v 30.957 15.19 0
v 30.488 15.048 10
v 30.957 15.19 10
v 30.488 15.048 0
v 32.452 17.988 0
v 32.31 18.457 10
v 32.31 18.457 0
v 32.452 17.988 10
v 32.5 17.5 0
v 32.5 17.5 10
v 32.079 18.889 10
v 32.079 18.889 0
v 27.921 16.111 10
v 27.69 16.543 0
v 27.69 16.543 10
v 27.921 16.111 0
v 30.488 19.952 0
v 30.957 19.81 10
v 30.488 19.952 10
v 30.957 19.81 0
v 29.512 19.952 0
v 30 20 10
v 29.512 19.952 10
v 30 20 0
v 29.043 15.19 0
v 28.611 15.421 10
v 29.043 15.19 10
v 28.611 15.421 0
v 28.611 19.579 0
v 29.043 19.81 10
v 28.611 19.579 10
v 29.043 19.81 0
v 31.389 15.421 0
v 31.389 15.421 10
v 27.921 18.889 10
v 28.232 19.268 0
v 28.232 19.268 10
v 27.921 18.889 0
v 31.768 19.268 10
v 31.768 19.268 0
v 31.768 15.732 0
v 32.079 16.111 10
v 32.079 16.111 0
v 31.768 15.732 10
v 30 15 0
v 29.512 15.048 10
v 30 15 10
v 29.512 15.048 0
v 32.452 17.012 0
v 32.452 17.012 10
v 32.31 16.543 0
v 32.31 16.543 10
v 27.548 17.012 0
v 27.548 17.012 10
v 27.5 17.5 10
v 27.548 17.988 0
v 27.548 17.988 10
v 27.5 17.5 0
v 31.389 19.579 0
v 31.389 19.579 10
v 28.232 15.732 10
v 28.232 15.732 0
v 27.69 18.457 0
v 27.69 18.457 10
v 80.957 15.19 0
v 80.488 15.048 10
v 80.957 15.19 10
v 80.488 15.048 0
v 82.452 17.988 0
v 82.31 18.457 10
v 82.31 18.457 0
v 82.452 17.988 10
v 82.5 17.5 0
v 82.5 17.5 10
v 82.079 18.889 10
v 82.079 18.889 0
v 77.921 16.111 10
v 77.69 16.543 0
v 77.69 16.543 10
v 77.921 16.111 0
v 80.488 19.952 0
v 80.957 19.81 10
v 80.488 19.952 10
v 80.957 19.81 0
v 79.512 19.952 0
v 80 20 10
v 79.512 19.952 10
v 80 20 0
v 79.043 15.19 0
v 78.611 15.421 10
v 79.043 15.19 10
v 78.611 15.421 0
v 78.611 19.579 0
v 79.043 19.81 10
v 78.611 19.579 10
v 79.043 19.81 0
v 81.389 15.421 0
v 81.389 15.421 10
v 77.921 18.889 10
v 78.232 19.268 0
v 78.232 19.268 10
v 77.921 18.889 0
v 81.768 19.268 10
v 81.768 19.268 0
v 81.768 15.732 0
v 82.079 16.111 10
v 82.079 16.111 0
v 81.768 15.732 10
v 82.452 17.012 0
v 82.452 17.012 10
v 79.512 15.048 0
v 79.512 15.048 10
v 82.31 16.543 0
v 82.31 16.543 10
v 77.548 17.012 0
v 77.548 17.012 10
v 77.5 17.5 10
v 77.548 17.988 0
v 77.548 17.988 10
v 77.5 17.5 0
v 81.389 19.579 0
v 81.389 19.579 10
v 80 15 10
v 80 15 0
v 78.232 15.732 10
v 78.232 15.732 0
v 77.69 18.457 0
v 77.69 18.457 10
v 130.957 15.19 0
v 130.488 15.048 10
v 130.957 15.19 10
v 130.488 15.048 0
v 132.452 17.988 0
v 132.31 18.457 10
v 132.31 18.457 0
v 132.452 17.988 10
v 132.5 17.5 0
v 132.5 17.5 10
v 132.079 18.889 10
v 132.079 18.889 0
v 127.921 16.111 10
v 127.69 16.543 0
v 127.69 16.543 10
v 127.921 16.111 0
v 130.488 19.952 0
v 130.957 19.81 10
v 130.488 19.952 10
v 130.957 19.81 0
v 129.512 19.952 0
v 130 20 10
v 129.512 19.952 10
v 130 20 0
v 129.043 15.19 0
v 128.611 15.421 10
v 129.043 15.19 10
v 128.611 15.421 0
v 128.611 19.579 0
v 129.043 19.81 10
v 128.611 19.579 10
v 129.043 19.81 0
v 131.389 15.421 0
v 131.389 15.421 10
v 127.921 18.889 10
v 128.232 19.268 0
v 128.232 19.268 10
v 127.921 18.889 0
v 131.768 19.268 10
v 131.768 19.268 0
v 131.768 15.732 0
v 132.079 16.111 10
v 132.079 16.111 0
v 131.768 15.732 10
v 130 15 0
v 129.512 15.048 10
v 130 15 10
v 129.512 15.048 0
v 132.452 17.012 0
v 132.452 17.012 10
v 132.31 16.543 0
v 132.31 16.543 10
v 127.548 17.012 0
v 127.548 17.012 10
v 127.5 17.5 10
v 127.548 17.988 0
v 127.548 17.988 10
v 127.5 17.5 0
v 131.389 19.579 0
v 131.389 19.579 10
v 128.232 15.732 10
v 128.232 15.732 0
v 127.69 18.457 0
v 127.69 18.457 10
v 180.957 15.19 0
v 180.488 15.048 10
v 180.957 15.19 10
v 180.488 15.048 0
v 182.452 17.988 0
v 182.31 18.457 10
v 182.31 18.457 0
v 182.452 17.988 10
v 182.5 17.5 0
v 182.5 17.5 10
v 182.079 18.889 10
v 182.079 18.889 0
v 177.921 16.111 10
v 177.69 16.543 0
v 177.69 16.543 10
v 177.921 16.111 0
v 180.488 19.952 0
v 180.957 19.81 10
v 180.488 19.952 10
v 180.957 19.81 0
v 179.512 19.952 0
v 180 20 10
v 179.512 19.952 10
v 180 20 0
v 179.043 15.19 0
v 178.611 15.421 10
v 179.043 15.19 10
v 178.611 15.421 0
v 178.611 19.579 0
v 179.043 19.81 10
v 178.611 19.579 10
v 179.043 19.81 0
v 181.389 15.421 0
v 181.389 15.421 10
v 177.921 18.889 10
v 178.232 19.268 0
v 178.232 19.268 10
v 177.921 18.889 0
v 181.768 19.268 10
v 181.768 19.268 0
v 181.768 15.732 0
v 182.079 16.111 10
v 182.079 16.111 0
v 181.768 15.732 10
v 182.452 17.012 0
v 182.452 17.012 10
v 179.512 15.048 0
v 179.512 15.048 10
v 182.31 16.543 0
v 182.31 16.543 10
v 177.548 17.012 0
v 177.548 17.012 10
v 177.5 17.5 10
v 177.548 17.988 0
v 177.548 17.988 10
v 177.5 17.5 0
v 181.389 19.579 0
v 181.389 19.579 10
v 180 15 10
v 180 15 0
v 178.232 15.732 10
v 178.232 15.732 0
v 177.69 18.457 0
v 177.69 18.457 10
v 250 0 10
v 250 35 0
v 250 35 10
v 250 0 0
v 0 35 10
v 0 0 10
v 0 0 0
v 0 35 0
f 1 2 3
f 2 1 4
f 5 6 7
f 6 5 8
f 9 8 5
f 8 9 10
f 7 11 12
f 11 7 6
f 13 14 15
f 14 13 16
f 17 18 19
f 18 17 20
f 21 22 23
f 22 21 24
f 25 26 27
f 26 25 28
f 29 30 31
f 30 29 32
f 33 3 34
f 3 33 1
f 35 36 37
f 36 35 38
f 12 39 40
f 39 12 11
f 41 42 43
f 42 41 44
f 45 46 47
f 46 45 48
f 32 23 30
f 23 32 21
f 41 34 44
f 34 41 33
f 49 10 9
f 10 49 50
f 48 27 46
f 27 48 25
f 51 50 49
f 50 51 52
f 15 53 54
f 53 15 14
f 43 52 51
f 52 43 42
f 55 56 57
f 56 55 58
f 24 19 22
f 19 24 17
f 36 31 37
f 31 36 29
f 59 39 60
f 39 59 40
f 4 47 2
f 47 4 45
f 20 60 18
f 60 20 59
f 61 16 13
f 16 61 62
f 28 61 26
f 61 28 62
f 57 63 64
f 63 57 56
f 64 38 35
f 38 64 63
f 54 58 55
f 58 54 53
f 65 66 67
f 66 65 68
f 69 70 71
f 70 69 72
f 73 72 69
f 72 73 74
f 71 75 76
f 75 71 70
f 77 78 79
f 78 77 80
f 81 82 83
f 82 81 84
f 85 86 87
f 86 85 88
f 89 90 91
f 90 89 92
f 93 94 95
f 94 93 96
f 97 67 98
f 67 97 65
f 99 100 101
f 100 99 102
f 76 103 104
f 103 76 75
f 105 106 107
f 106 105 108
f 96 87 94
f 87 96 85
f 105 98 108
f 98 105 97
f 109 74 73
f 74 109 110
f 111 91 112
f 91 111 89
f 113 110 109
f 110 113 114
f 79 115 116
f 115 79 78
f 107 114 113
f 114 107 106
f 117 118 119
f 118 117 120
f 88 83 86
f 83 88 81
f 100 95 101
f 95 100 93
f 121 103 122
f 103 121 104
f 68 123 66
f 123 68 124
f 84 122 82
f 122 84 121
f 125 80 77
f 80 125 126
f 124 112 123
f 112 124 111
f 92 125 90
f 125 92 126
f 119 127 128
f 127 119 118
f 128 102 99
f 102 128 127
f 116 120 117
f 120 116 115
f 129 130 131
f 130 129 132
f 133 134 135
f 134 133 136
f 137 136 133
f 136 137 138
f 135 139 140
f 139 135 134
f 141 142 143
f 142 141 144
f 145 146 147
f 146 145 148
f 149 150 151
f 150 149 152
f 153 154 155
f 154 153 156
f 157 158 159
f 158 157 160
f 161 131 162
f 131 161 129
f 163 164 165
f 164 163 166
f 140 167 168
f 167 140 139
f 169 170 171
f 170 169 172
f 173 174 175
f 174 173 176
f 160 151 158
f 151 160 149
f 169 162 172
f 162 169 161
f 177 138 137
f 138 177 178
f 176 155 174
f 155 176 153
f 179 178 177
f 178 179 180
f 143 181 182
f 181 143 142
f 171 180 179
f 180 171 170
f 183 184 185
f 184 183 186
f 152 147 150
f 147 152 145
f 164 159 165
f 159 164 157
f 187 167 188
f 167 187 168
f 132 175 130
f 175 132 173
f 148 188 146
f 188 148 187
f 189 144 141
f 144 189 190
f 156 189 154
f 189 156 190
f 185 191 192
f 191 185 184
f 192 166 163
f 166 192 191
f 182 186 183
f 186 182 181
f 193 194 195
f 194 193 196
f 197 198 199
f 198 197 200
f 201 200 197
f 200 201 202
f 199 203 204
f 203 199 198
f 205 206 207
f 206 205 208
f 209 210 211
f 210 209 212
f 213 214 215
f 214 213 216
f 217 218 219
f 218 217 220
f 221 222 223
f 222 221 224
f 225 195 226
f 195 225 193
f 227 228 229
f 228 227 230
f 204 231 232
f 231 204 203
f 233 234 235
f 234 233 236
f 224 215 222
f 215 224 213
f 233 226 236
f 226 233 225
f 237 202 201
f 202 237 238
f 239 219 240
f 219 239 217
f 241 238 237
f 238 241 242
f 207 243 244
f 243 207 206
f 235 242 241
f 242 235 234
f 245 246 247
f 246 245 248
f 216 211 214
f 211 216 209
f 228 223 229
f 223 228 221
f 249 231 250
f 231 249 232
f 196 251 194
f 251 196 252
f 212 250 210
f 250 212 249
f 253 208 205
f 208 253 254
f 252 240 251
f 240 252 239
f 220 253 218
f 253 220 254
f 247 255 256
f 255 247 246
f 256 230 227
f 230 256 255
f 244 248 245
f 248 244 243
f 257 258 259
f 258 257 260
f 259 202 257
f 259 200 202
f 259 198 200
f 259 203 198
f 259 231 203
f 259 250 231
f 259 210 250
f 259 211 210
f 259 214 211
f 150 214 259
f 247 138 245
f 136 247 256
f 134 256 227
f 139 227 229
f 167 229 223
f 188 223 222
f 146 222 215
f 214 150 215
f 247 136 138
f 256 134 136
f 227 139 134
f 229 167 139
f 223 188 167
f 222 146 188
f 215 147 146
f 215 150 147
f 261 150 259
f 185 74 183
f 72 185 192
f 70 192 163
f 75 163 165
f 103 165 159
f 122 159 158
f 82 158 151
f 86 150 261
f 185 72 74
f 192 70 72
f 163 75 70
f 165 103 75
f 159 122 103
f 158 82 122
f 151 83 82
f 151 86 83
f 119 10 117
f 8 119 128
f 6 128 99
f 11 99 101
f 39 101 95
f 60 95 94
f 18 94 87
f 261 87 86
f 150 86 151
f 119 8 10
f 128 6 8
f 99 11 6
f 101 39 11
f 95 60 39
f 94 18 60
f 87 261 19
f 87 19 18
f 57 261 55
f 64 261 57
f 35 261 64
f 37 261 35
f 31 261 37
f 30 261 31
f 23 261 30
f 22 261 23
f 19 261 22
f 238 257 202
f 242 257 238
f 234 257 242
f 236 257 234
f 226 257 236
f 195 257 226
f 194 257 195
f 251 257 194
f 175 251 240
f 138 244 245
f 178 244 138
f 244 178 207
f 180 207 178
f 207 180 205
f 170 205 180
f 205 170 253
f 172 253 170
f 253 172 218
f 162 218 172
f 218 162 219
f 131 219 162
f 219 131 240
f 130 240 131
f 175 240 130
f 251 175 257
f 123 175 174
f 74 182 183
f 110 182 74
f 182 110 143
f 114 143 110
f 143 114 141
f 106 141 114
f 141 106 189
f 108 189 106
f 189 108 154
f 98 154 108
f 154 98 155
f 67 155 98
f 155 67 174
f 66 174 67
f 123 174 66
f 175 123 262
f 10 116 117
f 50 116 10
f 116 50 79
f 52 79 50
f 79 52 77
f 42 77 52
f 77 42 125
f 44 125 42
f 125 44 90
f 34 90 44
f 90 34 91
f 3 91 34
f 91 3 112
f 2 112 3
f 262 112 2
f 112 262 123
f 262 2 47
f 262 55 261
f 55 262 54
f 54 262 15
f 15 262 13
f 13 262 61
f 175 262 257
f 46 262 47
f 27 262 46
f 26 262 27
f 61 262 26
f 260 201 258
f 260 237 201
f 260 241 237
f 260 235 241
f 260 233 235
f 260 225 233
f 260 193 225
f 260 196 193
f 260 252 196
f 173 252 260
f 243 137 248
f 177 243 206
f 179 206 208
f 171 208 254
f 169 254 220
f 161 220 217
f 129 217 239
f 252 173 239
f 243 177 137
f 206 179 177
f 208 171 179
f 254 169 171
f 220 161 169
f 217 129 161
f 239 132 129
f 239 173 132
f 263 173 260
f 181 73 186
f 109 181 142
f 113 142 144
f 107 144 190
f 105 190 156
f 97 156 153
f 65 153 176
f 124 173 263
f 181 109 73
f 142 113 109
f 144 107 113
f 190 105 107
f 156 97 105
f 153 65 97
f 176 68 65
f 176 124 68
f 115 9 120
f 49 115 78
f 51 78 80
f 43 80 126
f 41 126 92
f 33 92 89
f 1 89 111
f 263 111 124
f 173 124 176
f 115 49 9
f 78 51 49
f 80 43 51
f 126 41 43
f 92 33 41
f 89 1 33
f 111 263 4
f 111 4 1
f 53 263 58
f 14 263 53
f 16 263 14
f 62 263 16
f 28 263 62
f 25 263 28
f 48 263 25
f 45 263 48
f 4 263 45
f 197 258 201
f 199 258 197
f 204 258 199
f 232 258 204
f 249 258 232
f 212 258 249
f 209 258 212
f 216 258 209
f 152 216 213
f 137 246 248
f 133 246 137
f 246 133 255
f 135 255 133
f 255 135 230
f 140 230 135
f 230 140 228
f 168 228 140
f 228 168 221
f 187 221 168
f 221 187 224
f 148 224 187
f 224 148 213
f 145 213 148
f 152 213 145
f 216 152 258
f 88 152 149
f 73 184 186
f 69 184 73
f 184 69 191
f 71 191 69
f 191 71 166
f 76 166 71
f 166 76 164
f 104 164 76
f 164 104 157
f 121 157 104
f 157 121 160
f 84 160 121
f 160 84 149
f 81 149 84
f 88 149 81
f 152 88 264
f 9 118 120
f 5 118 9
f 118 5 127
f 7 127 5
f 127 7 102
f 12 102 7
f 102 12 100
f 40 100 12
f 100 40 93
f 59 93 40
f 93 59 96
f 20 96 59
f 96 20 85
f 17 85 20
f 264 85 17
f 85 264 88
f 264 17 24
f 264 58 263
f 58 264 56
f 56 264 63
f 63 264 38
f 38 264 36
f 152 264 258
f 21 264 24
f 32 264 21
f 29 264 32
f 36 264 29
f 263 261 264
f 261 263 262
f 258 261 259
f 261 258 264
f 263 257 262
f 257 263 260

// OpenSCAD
$fn = 32;

// ----------------------------------------------------------------------
// Long rail: 200-250 mm mounting rail
// ----------------------------------------------------------------------

// --- parameters (mm) ---
rail_l = 250;             // rail length, X
rail_w = 35;              // rail width, Y
rail_t = 10;              // rail thickness, Z
hole_d = 5;               // mounting hole diameter
hole_start = 30;          // first hole offset from the end
hole_pitch = 50;          // hole pitch
holes = 4;                // number of holes

difference() {
  cube([rail_l, rail_w, rail_t]);
  for (i = [0 : holes - 1])
    translate([hole_start + i * hole_pitch, rail_w / 2, -1])
      cylinder(h = rail_t + 2, d = hole_d);
}
